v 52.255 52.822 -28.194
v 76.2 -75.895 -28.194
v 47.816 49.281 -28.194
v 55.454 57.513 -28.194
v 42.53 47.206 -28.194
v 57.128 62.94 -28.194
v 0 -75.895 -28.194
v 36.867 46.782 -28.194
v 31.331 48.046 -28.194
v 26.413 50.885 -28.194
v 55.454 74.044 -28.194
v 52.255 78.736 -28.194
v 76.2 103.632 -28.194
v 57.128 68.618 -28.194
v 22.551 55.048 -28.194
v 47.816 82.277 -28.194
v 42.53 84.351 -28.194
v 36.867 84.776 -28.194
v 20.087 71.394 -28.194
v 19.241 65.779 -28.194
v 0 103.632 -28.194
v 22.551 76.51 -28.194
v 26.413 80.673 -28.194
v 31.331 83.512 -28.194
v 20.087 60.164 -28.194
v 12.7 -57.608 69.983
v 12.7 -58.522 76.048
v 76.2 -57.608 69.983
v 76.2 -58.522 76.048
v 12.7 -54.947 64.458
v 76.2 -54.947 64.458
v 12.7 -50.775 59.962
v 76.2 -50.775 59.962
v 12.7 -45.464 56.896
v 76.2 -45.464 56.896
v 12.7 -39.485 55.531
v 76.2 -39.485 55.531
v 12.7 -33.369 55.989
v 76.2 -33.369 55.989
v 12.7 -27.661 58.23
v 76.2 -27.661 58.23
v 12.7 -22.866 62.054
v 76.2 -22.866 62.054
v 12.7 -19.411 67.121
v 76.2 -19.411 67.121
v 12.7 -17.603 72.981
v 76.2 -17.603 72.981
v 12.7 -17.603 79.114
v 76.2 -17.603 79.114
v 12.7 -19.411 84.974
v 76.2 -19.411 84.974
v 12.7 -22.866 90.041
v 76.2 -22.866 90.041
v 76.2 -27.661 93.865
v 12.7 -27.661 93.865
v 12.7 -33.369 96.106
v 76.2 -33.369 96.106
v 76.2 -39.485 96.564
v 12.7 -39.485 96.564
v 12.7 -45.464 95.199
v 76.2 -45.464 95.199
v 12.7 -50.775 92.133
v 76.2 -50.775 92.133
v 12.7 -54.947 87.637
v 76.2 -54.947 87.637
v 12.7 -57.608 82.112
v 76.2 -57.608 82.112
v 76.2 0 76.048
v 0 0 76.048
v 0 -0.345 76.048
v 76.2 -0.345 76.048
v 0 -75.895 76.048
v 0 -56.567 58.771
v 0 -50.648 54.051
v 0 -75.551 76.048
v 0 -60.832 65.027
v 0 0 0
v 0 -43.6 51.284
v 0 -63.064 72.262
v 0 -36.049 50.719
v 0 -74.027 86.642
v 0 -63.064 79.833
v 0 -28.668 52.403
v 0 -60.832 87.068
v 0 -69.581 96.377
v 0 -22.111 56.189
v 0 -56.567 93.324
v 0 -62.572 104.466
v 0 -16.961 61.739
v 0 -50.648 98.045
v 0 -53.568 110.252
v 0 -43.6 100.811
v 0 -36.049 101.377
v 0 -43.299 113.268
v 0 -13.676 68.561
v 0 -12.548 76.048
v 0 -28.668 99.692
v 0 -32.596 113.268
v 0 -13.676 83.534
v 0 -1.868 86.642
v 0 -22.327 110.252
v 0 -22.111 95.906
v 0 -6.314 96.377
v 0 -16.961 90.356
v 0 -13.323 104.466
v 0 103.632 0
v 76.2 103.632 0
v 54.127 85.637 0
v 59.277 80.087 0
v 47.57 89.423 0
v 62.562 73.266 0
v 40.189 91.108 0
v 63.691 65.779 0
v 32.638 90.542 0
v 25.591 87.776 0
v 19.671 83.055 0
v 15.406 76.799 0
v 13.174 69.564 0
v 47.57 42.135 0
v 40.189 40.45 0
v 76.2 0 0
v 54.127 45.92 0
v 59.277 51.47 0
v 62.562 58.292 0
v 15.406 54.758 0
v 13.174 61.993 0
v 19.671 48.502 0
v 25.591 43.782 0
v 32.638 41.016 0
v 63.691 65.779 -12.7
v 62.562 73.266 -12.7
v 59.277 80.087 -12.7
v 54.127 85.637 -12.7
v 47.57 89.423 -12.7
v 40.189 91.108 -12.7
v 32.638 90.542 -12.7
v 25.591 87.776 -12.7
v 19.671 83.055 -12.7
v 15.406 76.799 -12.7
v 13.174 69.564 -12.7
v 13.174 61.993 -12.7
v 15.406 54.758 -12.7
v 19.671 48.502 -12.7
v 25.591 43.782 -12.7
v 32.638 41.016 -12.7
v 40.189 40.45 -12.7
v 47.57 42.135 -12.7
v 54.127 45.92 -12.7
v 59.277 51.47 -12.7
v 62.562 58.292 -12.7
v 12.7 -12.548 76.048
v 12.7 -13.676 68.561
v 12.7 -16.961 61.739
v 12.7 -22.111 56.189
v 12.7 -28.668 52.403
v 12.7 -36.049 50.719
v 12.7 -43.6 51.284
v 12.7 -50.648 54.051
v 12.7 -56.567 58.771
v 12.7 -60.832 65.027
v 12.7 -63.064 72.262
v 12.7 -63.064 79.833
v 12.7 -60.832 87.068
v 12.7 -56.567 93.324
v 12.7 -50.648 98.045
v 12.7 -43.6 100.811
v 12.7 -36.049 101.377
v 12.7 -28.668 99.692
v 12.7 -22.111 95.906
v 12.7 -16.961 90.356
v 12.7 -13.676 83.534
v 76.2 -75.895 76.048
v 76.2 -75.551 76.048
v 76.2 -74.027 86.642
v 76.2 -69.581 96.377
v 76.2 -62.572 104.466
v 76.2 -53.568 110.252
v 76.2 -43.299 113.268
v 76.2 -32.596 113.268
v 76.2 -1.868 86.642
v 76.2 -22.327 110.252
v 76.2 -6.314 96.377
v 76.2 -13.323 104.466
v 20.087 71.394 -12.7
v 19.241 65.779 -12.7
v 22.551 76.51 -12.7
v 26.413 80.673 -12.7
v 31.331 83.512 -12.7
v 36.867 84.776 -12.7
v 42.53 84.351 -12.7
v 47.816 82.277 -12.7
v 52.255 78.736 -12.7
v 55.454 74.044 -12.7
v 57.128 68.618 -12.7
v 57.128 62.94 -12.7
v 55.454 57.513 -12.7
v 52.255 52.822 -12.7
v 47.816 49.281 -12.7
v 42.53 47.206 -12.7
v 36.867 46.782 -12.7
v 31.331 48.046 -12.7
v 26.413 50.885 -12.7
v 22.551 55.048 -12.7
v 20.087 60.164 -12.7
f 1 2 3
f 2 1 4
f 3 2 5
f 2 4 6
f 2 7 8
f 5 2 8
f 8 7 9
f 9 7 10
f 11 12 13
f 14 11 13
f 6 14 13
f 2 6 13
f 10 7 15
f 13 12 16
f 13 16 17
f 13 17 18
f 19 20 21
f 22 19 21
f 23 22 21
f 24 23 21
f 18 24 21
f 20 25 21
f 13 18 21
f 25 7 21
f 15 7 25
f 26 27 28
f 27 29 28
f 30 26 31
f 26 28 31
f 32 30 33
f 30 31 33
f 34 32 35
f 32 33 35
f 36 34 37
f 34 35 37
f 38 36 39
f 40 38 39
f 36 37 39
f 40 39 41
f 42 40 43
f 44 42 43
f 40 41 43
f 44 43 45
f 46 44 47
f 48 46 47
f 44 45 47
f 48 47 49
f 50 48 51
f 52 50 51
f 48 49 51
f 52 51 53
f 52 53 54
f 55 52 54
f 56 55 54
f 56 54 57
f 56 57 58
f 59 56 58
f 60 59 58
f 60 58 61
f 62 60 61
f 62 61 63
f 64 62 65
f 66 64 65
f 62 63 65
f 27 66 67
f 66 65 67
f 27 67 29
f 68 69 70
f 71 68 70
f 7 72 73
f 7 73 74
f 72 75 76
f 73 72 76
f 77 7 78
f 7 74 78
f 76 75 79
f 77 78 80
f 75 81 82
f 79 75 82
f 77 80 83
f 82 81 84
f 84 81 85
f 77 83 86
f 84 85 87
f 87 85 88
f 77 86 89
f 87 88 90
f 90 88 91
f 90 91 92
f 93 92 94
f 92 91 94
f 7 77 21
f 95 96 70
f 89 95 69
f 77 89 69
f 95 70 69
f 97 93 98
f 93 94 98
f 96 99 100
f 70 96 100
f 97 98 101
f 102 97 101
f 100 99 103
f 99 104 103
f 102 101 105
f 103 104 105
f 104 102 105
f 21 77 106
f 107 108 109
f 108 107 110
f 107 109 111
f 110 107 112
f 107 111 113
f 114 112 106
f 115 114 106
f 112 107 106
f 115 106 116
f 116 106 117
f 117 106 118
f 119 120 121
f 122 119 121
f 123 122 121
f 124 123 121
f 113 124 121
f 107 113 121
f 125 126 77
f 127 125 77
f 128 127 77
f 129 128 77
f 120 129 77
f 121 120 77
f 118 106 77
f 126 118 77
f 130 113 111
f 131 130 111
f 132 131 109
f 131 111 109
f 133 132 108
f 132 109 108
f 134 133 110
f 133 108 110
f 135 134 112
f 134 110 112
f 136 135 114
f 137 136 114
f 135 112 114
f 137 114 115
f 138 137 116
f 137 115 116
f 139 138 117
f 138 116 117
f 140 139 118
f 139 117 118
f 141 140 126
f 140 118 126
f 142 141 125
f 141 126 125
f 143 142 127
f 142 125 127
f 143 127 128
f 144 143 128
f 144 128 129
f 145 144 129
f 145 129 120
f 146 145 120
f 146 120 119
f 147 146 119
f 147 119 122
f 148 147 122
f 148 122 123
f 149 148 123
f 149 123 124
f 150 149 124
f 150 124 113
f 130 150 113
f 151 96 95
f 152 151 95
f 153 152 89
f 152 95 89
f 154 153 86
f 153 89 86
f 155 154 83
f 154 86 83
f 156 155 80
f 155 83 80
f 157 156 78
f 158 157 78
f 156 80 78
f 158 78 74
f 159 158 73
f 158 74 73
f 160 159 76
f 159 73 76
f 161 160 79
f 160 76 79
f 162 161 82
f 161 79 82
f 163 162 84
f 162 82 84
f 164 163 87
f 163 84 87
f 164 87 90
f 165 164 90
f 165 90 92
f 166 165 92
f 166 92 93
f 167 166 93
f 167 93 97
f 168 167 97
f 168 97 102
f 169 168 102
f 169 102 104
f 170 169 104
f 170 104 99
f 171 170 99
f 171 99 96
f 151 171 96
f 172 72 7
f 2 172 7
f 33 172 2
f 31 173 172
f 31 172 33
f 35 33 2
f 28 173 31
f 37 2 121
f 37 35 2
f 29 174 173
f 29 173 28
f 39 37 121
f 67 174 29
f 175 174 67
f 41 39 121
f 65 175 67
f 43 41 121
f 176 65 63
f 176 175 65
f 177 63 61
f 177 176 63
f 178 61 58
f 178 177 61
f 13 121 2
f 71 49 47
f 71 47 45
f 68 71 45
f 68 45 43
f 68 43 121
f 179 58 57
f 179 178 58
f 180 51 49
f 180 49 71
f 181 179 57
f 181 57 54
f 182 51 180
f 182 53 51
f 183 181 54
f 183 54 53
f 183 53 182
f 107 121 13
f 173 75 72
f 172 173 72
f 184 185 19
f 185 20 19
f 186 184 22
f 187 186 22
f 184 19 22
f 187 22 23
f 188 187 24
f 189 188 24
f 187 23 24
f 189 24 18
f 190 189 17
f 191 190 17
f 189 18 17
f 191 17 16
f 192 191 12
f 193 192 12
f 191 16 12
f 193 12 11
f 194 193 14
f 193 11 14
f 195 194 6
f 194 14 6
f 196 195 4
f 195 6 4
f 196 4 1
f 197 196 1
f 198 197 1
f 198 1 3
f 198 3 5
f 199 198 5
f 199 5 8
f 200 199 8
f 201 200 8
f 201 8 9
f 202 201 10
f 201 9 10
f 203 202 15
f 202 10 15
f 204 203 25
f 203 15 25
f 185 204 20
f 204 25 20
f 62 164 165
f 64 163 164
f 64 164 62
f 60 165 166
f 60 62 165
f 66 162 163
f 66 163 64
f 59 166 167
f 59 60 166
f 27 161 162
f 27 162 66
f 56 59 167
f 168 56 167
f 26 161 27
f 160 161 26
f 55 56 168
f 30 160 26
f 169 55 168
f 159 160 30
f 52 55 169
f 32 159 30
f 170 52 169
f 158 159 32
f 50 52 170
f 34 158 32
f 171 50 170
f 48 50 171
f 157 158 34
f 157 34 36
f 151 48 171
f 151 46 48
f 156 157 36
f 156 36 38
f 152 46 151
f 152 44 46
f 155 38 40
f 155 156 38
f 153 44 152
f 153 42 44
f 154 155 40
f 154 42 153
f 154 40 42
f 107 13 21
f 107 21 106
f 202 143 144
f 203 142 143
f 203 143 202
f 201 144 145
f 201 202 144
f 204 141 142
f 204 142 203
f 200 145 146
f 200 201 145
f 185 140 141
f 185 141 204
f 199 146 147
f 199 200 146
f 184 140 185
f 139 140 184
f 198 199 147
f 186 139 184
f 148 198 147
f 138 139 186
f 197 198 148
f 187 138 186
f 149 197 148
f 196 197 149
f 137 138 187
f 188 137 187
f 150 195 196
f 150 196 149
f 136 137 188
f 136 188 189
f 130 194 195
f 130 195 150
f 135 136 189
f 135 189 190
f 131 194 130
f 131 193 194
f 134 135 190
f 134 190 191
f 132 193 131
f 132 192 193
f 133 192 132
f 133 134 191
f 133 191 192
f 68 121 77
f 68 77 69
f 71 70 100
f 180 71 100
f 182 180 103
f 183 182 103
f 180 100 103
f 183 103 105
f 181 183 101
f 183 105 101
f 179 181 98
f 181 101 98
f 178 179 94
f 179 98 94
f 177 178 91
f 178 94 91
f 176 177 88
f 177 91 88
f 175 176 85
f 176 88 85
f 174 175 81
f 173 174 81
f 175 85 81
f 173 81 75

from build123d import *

# Parameters (mm, degrees)
F1_DEPTH       = 76.2
F3_D           = 38.1
F3_DEPTH       = 38.1
F3_CBORE_D     = 50.8
F3_CBORE_DEPTH = 12.7
F3_TIP         = 11.4463947925
F4_D           = 41.148
F4_DEPTH       = 76.2
F4_CBORE_D     = 50.8
F4_CBORE_DEPTH = 12.7
F4_TIP         = 12.3621063759


with BuildPart() as f1:
    # F0 (on Right) → F1 (new body)
    with BuildSketch(Plane.YZ):
        with BuildLine():
            ThreePointArc((-0.3445927945, 76.0475993156), (-37.9475988448, 113.6506053659), (-75.5506048951, 76.0475993156))
            Line((-75.5506048951, 76.0475993156), (-0.3445927945, 76.0475993156))
        make_face()
        Polygon((-75.8951976895, 76.0475993156), (-75.8951976895, 0), (0, 0), (0, 76.0475993156), (-0.3445927945, 76.0475993156), (-75.5506048951, 76.0475993156), align=None)
        Polygon((0, 0), (-75.8951976895, 0), (-75.8951976895, -28.1940009445), (103.6320030689, -28.1940009445), (103.6320030689, 0), align=None)
    extrude(amount=F1_DEPTH)

    # F3
    with Locations(Plane.XY):
        with Locations((38.2905006409, 65.7788068056)):
            CounterBoreHole(F3_D / 2, F3_CBORE_D / 2, F3_CBORE_DEPTH, depth=F3_DEPTH)
            with Locations((0, 0, -(F3_DEPTH + F3_TIP / 2))):  # 118° drill point
                Cone(0, F3_D / 2, F3_TIP, mode=Mode.SUBTRACT)

    # F4
    with Locations(Plane(origin=(0, 0, 0), x_dir=(0, 1, 0), z_dir=(-1, 0, 0))):
        with Locations((-37.9475988448, -76.0475993156)):
            CounterBoreHole(F4_D / 2, F4_CBORE_D / 2, F4_CBORE_DEPTH, depth=F4_DEPTH)
            with Locations((0, 0, -(F4_DEPTH + F4_TIP / 2))):  # 118° drill point
                Cone(0, F4_D / 2, F4_TIP, mode=Mode.SUBTRACT)


solid = f1.part
